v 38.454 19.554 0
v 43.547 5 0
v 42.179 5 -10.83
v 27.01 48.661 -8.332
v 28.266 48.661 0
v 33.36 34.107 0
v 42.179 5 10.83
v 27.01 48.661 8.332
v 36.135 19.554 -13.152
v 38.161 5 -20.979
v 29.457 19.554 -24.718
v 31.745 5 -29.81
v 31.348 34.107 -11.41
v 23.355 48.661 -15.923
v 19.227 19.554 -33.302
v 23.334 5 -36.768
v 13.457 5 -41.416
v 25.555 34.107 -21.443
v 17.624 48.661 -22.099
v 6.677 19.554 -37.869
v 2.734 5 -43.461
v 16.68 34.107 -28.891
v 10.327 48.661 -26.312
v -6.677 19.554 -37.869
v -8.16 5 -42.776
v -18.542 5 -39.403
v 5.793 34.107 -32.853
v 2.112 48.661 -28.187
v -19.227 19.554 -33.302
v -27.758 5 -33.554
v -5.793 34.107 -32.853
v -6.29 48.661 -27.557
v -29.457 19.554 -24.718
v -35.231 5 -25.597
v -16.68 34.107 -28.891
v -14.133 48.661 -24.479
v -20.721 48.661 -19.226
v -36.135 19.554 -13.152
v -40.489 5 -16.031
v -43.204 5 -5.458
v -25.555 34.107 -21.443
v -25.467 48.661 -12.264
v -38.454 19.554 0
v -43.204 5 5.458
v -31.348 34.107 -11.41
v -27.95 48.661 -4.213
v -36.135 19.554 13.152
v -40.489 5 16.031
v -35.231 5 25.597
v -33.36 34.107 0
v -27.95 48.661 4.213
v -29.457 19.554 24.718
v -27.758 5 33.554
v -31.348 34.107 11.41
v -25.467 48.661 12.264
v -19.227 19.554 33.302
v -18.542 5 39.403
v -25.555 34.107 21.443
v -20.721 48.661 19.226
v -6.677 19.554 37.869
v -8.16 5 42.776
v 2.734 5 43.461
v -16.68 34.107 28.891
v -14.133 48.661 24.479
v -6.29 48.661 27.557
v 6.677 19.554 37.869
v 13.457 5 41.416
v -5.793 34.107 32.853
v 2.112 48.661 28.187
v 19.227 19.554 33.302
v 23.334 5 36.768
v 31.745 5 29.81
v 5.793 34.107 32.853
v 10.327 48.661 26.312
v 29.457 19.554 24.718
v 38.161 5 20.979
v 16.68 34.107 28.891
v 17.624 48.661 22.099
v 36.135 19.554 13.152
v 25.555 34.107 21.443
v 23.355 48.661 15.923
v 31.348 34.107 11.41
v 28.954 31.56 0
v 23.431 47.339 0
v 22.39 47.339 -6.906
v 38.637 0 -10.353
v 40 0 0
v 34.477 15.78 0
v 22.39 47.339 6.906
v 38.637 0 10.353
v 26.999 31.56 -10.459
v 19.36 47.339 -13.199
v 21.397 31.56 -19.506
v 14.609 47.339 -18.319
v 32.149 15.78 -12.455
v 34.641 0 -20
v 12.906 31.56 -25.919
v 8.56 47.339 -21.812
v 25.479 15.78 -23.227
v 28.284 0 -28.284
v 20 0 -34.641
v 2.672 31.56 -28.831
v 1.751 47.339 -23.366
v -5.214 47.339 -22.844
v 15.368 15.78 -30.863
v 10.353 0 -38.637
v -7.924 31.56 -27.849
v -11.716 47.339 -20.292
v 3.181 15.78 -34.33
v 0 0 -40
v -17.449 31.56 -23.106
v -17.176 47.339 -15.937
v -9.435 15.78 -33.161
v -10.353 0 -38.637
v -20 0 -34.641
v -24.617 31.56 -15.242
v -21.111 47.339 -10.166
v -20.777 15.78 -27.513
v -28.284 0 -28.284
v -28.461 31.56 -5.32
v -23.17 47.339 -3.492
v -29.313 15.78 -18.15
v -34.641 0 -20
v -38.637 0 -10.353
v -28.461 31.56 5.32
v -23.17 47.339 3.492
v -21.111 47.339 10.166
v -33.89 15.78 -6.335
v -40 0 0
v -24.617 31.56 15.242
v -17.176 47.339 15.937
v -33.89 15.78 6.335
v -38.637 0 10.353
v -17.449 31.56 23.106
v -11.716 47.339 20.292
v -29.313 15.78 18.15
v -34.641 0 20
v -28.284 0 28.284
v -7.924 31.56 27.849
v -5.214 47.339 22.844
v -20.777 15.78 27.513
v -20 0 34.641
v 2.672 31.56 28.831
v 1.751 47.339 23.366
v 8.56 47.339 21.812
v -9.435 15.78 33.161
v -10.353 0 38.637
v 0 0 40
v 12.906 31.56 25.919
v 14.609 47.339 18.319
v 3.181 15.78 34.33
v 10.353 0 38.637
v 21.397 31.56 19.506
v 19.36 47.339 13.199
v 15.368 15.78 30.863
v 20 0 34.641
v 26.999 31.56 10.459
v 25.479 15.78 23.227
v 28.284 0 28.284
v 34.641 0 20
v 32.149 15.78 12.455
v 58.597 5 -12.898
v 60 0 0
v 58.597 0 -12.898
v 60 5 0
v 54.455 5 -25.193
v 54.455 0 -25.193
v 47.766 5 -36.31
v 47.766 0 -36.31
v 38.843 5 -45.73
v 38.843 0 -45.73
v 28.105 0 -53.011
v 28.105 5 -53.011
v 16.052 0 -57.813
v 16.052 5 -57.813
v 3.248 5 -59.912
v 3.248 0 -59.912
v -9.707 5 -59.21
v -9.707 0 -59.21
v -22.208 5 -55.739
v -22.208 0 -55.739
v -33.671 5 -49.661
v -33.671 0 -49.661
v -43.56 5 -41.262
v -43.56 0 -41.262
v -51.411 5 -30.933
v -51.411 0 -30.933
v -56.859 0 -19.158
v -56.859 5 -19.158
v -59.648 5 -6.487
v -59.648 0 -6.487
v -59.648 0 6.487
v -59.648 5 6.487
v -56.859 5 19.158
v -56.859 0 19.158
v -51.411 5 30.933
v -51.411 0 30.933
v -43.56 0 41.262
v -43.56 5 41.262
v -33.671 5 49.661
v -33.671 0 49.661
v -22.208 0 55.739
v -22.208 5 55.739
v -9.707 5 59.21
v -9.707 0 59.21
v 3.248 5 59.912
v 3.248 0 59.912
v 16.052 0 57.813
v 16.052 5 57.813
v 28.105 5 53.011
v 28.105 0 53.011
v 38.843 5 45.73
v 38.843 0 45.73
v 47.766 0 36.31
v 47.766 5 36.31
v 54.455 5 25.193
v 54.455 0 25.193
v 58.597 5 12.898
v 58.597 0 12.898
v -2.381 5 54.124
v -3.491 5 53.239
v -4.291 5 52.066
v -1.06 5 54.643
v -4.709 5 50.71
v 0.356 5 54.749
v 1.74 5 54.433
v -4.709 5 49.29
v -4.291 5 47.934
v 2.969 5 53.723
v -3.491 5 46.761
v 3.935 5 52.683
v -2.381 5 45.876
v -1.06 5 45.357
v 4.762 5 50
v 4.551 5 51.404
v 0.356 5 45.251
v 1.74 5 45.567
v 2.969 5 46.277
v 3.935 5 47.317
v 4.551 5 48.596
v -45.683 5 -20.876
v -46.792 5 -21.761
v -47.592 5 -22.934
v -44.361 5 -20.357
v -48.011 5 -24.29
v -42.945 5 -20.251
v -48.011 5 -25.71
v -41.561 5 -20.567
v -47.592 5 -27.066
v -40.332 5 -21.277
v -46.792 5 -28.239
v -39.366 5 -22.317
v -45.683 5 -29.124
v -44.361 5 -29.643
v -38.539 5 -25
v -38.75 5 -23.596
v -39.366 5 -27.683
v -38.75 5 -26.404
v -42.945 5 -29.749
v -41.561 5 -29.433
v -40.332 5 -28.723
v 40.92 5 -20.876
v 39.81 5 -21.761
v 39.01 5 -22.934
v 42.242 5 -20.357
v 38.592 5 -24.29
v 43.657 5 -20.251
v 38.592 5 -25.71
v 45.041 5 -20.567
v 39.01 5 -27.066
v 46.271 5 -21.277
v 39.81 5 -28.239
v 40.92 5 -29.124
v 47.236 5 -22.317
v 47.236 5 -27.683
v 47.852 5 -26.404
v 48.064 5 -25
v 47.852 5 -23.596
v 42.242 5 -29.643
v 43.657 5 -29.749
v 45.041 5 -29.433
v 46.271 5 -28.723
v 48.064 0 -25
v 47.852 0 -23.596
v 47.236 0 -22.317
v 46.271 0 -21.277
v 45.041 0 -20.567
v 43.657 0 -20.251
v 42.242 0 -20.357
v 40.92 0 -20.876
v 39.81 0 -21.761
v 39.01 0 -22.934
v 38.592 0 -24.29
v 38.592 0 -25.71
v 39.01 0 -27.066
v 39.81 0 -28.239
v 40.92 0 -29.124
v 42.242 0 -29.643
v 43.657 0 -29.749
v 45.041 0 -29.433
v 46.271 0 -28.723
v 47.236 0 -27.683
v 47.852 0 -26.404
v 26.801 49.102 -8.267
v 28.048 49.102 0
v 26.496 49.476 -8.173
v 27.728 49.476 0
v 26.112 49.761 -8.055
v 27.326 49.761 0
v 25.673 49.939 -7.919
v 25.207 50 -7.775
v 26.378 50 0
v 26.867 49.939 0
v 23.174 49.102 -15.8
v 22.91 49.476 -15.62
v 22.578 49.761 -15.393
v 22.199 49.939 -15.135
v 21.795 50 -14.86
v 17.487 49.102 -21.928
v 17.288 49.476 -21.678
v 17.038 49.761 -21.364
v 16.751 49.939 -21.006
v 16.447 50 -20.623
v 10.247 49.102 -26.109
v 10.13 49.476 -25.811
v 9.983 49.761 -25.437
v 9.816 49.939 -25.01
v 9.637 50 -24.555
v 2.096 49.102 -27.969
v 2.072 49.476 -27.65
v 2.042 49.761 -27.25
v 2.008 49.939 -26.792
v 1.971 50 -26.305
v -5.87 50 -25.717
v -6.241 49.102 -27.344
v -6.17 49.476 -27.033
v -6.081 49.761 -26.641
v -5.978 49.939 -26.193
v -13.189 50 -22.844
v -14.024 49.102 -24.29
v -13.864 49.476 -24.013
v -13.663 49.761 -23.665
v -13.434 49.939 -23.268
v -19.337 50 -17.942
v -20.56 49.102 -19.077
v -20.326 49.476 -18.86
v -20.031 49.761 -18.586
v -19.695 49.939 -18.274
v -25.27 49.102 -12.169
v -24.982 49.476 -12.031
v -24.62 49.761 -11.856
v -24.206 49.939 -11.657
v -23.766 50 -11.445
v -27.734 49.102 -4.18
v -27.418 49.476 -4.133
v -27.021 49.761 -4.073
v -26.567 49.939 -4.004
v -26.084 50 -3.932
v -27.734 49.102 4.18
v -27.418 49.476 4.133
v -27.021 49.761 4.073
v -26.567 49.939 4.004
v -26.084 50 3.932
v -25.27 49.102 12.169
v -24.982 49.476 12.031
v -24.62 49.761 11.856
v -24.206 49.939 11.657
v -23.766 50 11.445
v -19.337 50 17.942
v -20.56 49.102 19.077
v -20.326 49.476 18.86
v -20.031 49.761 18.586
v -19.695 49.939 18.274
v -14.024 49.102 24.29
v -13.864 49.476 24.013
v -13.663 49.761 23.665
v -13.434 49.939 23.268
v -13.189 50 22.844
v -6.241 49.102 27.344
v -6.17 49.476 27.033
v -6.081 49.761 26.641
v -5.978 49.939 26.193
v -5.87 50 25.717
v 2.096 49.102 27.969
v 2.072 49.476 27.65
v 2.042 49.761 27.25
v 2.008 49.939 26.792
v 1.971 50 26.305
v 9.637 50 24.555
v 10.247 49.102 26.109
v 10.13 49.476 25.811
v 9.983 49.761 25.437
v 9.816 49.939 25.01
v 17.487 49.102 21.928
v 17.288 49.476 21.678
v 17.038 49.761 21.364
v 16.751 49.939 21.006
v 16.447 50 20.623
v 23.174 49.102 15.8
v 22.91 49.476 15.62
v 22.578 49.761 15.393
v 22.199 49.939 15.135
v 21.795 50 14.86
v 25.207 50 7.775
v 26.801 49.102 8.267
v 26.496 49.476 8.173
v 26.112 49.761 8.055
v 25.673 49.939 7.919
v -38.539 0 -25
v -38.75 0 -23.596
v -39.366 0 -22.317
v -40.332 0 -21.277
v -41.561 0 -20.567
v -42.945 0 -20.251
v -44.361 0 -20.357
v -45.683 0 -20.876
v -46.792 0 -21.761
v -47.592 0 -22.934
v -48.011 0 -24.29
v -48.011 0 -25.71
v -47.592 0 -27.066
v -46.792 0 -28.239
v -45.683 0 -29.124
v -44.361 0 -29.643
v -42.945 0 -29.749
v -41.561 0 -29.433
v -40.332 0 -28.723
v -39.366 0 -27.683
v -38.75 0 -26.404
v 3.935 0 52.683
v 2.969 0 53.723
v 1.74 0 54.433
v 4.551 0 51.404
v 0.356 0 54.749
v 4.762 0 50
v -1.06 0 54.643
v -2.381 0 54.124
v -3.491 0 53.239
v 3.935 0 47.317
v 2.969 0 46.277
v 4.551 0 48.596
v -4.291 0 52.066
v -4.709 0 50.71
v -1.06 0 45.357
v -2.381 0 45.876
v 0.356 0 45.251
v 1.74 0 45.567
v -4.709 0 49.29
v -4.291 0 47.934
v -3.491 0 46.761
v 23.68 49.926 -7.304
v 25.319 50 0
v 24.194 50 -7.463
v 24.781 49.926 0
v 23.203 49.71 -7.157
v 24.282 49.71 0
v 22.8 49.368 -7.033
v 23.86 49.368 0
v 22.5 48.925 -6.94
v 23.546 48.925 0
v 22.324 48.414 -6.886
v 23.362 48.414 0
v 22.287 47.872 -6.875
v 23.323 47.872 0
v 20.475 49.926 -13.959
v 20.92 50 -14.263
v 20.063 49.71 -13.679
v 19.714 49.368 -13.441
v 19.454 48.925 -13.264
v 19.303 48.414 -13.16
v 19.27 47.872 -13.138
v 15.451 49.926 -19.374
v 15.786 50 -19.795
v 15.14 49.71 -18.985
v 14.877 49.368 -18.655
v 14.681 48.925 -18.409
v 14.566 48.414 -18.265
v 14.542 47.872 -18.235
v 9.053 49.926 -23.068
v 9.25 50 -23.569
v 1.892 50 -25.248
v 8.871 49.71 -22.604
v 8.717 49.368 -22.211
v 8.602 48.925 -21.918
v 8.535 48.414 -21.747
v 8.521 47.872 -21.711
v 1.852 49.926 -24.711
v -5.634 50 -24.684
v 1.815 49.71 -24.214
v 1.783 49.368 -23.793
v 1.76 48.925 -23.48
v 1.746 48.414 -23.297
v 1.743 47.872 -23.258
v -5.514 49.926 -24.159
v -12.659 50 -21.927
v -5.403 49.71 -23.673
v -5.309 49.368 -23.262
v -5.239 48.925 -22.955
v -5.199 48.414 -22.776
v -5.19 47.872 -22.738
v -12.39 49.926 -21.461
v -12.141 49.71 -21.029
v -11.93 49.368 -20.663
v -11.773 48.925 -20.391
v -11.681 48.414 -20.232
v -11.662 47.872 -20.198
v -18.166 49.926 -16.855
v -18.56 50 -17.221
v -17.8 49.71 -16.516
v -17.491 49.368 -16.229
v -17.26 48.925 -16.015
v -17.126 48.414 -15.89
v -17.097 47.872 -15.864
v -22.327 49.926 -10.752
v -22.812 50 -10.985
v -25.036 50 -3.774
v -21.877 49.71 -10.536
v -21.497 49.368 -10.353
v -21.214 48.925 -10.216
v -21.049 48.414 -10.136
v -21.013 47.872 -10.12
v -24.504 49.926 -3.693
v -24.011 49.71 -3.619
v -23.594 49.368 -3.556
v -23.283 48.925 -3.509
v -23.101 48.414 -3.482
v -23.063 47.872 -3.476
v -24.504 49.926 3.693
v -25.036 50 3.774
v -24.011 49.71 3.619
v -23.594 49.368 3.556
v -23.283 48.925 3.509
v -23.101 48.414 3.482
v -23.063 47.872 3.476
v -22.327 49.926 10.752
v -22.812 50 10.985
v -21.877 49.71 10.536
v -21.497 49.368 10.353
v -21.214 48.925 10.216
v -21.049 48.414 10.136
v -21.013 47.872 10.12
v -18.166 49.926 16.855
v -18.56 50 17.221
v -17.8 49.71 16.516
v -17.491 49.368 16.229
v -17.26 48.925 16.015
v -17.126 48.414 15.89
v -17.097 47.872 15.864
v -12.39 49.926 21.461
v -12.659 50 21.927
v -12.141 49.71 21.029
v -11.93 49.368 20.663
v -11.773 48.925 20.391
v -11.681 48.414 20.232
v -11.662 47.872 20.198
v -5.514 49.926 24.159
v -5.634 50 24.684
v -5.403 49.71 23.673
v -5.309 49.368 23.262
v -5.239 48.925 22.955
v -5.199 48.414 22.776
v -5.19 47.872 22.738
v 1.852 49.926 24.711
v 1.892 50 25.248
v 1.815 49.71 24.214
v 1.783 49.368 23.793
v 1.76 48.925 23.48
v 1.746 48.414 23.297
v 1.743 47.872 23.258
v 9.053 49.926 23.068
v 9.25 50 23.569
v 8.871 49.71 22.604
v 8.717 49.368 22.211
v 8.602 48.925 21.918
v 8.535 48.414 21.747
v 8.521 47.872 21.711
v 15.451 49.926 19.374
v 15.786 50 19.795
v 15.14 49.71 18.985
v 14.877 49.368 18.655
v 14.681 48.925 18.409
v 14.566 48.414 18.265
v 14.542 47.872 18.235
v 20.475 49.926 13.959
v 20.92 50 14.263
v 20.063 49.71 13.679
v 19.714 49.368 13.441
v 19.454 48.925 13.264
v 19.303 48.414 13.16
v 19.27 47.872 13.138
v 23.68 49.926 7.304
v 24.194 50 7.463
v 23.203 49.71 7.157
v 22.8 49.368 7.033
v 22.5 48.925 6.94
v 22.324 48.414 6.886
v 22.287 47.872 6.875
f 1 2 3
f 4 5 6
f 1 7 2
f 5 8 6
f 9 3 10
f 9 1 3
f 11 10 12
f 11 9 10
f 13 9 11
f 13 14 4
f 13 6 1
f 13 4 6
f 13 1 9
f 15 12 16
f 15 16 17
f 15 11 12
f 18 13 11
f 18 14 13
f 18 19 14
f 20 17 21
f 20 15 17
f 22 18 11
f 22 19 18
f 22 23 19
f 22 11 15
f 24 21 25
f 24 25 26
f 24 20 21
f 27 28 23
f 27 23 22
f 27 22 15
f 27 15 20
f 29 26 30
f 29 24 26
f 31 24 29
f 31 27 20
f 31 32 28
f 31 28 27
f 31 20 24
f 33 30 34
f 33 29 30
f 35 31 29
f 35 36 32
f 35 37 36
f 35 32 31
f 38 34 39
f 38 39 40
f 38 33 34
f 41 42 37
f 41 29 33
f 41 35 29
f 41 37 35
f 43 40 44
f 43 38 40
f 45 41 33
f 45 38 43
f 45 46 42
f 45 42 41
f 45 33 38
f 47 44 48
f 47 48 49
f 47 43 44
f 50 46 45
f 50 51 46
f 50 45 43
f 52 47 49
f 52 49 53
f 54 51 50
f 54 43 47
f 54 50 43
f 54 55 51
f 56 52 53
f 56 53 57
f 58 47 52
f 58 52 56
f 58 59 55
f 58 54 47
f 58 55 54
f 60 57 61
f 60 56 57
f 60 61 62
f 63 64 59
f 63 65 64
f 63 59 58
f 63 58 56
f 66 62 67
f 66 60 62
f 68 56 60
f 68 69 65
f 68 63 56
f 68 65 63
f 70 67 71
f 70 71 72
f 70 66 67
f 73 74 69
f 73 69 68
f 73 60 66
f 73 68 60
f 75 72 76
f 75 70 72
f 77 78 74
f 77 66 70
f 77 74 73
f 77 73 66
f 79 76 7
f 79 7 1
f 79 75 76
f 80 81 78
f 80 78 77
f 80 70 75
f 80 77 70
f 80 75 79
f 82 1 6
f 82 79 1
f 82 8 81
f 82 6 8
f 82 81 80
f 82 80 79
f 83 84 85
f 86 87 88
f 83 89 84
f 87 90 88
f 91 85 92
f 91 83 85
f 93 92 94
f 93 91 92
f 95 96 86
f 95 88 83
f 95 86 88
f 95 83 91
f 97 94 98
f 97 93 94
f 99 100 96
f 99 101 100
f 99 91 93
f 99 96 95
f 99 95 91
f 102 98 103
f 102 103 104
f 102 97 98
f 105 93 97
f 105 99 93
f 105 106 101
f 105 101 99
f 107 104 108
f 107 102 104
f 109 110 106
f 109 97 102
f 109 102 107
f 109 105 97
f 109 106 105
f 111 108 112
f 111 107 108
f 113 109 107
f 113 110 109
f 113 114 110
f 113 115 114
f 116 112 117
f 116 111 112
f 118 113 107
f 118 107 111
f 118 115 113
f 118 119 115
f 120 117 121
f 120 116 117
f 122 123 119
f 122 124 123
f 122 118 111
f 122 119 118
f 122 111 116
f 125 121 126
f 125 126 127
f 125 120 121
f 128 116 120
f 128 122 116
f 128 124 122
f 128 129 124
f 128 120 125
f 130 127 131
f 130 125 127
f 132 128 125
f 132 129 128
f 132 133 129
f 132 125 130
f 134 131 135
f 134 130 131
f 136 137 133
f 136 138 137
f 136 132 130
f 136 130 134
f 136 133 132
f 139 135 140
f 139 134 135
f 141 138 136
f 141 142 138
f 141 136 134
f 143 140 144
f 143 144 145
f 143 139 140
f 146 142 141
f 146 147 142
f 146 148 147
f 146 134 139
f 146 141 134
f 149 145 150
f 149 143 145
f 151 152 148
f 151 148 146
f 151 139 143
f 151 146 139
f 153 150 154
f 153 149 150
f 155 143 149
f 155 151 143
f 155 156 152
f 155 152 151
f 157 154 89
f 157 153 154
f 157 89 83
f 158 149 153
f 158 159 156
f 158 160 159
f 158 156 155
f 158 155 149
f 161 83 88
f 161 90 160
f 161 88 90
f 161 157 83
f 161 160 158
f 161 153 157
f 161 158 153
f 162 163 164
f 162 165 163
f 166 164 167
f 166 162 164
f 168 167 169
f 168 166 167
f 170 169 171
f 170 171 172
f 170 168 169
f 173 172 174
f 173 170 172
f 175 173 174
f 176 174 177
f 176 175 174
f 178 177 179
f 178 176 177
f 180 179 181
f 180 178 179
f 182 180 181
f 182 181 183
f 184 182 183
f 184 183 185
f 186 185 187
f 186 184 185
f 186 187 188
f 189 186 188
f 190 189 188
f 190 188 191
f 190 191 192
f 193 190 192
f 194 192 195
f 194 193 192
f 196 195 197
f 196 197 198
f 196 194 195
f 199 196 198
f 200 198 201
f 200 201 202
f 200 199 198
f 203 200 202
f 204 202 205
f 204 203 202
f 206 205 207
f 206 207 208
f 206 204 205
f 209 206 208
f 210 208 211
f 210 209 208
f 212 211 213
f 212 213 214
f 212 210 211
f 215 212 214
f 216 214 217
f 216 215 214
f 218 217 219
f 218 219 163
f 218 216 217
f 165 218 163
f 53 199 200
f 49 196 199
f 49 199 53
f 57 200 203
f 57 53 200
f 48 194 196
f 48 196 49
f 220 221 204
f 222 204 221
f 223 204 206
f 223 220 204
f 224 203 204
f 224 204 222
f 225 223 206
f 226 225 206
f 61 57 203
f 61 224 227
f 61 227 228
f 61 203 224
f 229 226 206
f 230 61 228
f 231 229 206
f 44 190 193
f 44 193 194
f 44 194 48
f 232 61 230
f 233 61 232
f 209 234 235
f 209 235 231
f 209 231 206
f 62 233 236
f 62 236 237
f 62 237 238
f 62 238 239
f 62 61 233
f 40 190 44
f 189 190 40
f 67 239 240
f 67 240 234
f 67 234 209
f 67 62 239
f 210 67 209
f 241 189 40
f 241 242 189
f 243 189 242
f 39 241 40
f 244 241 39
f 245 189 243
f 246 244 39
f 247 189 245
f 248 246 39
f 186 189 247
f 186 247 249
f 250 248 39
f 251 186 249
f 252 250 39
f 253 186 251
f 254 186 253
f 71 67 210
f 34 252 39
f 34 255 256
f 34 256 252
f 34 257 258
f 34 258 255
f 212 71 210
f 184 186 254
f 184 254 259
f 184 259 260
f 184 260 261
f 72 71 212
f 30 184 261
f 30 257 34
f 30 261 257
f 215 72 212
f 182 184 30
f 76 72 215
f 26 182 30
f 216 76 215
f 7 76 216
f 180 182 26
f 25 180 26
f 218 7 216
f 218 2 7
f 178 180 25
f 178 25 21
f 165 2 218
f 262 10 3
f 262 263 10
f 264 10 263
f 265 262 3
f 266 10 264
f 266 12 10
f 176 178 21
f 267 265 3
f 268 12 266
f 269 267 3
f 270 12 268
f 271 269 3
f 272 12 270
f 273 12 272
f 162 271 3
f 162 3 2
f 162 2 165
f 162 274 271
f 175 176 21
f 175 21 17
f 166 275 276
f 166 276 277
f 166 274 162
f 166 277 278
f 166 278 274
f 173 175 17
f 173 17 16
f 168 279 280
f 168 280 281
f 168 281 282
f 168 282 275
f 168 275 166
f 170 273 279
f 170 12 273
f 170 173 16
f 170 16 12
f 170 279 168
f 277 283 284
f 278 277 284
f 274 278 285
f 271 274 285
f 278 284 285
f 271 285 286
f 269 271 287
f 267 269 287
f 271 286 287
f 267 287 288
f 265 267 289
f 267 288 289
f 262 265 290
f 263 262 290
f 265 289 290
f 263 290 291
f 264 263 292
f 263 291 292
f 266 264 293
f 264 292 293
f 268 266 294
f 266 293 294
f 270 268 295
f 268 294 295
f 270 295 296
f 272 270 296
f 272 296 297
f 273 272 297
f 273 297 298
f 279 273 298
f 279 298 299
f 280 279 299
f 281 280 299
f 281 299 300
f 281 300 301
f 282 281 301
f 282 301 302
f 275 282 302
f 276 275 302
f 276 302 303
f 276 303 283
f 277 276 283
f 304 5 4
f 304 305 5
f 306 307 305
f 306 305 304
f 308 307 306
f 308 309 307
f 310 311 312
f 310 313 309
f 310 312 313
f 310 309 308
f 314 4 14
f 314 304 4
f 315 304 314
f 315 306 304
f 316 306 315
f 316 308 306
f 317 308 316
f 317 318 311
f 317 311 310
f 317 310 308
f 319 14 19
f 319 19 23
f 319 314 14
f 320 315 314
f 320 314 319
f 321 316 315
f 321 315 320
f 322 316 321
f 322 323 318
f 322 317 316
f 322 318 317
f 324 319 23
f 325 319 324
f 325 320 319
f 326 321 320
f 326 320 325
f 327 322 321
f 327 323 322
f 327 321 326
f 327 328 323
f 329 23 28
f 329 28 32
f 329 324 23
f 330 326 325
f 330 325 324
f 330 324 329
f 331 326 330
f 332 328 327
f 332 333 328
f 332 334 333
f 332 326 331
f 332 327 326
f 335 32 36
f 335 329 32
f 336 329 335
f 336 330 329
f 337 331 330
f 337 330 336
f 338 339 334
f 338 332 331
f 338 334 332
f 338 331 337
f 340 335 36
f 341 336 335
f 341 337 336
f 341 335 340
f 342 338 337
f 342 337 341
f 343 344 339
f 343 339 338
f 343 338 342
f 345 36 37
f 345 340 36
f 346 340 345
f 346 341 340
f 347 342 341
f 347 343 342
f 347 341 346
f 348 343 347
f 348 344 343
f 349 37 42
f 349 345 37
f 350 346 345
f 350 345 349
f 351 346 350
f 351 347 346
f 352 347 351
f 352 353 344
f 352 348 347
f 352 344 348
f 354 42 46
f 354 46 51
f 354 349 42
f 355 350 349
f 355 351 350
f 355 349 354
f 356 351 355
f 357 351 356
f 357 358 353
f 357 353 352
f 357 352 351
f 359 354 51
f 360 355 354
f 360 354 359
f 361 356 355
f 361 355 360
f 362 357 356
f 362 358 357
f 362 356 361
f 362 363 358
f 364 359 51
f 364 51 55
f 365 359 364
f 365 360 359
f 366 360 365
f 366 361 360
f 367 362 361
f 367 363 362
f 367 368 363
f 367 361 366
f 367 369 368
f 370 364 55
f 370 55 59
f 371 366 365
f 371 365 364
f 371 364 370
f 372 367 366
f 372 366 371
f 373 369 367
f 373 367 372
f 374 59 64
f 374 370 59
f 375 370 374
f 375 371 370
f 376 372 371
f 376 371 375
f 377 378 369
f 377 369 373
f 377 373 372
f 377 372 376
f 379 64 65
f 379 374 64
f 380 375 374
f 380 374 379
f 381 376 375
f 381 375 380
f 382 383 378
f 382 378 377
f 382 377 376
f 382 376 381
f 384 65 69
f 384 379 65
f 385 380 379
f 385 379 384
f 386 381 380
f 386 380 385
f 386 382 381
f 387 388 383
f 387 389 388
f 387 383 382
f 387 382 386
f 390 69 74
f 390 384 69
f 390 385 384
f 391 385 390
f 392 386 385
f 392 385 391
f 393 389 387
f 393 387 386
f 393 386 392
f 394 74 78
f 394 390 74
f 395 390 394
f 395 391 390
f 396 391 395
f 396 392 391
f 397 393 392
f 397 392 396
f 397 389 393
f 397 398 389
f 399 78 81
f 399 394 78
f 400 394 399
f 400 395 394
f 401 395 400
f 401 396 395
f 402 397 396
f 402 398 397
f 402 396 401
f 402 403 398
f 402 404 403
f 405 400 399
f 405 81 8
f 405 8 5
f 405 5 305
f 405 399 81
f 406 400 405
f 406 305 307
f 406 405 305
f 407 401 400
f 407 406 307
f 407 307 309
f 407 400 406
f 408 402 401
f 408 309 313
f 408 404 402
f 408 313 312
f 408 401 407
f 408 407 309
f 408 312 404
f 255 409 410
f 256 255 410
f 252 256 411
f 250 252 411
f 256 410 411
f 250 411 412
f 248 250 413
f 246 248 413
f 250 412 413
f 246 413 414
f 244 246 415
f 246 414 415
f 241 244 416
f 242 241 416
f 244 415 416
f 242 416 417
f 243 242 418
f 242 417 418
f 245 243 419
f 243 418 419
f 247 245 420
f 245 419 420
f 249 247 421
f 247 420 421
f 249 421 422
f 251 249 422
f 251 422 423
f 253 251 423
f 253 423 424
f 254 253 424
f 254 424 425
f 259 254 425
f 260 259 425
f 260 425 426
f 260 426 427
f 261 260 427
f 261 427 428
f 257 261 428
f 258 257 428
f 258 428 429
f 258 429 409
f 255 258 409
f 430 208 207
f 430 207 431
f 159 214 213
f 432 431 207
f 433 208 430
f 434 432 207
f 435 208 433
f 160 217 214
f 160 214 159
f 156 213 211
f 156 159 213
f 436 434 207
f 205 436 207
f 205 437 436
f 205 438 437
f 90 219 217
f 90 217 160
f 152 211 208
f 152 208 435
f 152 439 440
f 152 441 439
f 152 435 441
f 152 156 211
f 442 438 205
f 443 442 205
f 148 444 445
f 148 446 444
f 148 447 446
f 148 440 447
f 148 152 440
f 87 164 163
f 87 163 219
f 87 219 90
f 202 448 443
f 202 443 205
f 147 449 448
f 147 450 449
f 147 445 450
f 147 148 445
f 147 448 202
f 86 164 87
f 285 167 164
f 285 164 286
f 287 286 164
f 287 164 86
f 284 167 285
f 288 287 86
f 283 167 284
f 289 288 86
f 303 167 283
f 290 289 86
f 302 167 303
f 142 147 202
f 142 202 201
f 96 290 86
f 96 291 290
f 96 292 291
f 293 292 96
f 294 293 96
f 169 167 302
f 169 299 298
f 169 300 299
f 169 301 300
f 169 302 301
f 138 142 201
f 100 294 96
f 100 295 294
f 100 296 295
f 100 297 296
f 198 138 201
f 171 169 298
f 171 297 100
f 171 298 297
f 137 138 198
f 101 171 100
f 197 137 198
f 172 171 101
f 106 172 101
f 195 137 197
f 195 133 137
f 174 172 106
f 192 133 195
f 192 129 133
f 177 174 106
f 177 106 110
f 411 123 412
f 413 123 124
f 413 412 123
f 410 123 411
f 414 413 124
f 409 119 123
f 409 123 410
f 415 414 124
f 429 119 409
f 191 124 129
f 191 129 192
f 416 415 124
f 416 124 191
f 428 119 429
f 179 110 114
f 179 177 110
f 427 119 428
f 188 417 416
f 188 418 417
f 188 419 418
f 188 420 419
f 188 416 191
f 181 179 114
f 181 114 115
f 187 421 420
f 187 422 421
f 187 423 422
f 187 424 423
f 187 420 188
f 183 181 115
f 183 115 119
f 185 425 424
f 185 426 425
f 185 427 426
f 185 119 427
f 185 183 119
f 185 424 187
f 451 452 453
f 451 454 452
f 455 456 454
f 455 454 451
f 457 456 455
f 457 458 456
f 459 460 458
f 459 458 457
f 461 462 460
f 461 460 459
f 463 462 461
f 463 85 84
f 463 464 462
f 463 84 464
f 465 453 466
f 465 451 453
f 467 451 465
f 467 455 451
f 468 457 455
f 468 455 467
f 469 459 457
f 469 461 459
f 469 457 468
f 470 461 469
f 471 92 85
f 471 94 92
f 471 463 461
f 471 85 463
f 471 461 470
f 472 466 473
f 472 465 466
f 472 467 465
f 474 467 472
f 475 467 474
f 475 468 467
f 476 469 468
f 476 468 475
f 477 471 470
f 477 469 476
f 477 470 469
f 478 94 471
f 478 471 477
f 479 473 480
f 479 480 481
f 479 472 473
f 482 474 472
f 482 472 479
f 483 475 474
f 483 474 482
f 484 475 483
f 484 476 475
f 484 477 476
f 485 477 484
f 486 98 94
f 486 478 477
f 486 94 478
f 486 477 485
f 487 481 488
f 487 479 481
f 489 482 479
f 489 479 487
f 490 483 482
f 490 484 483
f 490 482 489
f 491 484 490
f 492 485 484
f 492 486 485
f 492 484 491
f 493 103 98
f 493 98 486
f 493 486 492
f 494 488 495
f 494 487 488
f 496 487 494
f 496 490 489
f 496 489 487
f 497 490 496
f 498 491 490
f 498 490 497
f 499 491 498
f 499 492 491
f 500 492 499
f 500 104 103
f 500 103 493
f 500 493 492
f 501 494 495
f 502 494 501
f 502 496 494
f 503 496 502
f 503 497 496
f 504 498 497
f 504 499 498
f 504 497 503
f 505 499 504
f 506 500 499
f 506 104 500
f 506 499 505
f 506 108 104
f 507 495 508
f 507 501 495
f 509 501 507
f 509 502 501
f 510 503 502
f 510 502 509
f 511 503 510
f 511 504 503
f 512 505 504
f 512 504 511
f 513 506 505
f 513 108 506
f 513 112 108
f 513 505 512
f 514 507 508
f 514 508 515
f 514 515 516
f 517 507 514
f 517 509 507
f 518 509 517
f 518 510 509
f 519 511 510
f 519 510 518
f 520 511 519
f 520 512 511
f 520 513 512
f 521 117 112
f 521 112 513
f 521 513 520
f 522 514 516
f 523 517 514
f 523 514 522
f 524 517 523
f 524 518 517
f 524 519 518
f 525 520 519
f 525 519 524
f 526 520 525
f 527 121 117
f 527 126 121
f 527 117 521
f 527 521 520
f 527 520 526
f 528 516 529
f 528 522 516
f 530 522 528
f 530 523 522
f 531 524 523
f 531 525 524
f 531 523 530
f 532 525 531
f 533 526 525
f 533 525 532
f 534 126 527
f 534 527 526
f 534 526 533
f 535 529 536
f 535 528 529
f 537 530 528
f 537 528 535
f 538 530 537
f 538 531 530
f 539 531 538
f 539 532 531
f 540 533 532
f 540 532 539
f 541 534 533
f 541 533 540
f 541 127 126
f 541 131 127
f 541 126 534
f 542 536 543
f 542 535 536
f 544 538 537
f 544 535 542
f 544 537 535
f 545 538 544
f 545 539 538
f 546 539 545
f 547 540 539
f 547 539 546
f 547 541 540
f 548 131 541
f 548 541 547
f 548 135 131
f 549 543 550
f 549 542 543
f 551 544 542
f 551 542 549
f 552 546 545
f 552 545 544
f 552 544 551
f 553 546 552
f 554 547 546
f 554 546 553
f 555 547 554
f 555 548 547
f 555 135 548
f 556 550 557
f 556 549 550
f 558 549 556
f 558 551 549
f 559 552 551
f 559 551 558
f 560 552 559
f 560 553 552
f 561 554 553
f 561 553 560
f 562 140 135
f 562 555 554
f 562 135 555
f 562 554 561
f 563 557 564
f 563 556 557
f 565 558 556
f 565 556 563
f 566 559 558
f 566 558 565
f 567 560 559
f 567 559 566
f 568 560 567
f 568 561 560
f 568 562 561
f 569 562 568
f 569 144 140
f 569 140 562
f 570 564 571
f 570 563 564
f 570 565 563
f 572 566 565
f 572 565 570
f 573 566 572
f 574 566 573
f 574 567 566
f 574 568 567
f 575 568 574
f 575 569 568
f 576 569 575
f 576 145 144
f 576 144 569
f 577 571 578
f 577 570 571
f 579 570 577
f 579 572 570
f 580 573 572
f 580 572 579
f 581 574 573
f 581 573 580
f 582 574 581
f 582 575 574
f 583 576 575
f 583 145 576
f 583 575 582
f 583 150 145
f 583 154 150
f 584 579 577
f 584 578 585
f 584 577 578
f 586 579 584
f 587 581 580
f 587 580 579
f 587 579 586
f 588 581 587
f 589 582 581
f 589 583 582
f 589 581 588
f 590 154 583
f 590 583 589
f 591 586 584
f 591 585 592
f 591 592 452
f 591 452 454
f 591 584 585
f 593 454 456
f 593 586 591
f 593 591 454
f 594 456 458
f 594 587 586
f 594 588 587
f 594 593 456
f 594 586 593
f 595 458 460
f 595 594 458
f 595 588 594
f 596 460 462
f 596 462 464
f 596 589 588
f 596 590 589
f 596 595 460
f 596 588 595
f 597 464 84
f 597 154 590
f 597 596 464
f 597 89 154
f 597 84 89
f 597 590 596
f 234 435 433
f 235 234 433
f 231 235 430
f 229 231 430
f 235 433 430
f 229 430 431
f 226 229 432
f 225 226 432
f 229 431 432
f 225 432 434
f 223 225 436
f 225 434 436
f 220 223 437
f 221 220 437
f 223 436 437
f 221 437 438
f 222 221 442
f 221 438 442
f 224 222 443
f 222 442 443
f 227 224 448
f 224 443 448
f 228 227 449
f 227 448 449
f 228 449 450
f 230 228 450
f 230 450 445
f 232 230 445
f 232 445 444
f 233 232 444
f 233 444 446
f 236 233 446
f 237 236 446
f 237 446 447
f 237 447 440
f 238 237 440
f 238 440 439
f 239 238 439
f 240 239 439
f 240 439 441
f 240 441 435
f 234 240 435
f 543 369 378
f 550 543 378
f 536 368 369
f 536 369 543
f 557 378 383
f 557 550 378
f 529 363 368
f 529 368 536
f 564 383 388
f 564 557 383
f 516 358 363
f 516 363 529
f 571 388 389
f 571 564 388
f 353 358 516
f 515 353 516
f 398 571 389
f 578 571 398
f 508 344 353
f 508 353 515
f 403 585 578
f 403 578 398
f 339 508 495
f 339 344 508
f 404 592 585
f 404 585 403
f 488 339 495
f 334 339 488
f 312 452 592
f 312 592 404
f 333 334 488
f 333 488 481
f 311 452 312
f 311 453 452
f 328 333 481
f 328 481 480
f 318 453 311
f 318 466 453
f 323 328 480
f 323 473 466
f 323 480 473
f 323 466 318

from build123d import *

# Parameters (mm, degrees)
CROQUIS3_R            = 4.7625
CORTAR_EXTRUIR2_DEPTH = 10


with BuildPart() as part:
    # Croquis2 → Revolución1 (revolve)
    with BuildSketch(Plane.XY):
        with BuildLine():
            Line((40, 0), (60, 0))
            Line((60, 0), (60, 5))
            Line((60, 5), (43.547405025, 5))
            Line((43.547405025, 5), (28.266159728, 48.660700849))
            ThreePointArc((28.266159728, 48.660700849), (27.535723945, 49.631165488), (26.378443015, 50))
            Line((26.378443015, 50), (25.31896201, 50))
            ThreePointArc((25.31896201, 50), (23.687796522, 49.15728093), (23.431245297, 47.339299151))
            Line((23.431245297, 47.339299151), (40, 0))
        make_face()
    revolve(axis=Axis((0, 0, 0), (0, 1, 0)))

    # Croquis3 → Cortar-Extruir2 (cut)
    with BuildSketch(Plane.XZ):
        with Locations((0, 50)):
            Circle(CROQUIS3_R)
        with Locations((43.301270189, -25)):
            Circle(CROQUIS3_R)
        with Locations((-43.301270189, -25)):
            Circle(CROQUIS3_R)
    extrude(amount=-CORTAR_EXTRUIR2_DEPTH, mode=Mode.SUBTRACT)


solid = part.part
